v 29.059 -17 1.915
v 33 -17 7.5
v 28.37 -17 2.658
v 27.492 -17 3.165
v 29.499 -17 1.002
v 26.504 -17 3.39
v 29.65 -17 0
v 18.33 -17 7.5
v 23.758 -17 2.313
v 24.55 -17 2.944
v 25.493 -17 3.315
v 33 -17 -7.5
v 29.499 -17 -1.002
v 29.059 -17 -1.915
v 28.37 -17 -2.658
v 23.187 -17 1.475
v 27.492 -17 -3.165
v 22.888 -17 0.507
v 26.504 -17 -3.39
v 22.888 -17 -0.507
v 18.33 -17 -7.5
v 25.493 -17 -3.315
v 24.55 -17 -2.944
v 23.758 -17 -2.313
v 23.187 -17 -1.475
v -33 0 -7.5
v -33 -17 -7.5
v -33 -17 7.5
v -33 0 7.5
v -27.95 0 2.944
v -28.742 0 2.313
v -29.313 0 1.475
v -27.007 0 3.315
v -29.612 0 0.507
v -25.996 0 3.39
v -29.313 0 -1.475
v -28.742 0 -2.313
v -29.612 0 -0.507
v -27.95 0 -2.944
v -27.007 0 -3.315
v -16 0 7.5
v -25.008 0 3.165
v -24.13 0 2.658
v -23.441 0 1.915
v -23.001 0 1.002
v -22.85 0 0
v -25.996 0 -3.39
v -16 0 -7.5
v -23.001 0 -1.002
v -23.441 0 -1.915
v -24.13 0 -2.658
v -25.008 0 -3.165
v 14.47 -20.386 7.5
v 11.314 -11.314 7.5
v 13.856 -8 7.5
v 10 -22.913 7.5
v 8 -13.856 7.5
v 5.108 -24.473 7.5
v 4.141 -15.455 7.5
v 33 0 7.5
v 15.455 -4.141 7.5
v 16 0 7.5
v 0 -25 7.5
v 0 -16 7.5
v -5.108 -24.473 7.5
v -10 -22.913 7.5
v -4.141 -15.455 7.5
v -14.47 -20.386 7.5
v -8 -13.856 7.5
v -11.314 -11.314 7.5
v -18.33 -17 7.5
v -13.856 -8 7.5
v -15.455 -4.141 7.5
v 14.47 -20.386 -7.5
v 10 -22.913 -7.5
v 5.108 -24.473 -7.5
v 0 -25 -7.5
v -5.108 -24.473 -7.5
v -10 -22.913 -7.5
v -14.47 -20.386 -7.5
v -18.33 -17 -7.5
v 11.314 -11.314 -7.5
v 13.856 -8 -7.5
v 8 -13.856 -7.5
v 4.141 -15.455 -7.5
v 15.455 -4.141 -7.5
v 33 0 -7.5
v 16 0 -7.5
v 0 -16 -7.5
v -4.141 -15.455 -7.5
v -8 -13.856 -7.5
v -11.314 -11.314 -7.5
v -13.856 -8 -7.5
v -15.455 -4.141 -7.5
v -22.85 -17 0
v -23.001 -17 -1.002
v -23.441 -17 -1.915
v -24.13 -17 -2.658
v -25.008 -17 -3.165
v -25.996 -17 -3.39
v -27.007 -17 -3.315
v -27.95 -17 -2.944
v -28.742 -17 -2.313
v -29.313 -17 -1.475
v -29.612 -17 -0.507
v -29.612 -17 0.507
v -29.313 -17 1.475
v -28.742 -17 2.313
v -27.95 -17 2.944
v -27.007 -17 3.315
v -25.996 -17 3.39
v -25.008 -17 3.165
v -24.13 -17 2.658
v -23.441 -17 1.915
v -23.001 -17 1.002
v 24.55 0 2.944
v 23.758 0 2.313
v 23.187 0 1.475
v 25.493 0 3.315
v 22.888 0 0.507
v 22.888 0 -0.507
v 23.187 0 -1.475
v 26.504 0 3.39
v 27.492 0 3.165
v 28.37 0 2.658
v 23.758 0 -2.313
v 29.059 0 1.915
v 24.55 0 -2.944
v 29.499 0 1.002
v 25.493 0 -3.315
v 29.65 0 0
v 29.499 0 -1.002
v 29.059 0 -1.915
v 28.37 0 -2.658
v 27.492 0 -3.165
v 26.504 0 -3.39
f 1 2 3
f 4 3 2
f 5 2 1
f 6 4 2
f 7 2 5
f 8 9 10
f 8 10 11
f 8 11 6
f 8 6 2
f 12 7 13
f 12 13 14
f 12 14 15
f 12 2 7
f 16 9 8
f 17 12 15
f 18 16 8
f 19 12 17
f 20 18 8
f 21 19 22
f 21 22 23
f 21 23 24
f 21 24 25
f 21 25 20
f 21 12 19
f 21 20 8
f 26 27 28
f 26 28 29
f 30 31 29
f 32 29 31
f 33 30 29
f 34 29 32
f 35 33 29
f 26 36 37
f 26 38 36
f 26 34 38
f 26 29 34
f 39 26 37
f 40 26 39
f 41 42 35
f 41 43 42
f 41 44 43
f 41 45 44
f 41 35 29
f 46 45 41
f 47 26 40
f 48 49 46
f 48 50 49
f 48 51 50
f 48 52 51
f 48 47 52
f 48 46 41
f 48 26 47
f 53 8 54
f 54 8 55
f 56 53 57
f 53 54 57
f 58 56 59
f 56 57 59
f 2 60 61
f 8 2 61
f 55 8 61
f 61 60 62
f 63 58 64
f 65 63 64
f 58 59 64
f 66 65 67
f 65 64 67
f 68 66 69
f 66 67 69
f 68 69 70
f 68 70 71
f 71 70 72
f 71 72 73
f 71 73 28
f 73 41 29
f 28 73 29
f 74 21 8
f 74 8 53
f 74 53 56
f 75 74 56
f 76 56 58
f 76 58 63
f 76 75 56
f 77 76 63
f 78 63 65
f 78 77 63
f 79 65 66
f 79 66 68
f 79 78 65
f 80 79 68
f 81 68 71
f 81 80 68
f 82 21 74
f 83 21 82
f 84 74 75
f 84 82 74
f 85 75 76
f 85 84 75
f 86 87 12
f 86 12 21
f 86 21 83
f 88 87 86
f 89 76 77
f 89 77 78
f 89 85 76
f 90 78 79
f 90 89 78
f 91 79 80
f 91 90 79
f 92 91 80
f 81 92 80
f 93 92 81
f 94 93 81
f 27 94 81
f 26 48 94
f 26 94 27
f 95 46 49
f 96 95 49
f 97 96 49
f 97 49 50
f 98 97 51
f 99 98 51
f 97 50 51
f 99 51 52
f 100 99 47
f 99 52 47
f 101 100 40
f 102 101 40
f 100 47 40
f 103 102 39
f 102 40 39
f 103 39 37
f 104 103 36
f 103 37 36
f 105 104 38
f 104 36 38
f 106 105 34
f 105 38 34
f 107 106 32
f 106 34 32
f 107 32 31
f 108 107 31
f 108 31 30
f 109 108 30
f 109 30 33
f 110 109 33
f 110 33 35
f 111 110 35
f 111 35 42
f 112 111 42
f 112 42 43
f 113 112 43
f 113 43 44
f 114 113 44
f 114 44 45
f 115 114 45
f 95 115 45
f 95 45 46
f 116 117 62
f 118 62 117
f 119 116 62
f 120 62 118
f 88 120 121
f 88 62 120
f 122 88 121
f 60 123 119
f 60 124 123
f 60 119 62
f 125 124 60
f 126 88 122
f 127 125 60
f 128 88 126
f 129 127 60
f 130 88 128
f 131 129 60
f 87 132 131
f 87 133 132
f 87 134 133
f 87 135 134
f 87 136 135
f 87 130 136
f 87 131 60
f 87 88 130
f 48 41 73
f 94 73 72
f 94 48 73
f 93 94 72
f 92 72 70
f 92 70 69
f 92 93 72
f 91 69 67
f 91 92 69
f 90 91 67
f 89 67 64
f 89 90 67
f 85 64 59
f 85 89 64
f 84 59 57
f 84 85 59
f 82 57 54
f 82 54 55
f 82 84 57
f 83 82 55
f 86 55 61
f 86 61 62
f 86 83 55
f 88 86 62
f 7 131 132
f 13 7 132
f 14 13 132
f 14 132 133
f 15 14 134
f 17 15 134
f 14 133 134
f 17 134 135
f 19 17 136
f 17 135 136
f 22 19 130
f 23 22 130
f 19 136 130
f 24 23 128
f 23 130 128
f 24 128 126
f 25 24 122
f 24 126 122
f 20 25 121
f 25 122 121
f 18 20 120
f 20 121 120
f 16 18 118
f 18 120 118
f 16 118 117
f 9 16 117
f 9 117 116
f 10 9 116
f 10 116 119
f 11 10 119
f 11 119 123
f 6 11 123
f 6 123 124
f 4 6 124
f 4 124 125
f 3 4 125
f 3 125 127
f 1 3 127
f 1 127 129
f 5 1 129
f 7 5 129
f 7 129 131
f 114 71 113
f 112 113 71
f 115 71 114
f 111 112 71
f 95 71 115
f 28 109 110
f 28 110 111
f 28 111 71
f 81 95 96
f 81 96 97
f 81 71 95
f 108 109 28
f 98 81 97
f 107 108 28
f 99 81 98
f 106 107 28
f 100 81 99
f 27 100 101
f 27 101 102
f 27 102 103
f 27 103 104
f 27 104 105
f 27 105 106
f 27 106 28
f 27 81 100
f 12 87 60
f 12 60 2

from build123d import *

# Parameters (mm, degrees)
BOSS_EXTRUDE1_DEPTH      = 7.5
BOSS_EXTRUDE1_DEPTH_BACK = 7.5
TAP_DRILL_FOR_M8_TAP1_D  = 6.8


with BuildPart() as part:
    # Sketch1 → Boss-Extrude1 (new, two sides: drawn at the far end of the back side and taken through both)
    with BuildSketch(Plane.XY.offset(-BOSS_EXTRUDE1_DEPTH_BACK)):
        with BuildLine():
            Line((-33, 0), (-16, 0))
            ThreePointArc((-16, 0), (0, -16), (16, 0))
            Line((16, 0), (33, 0))
            Line((33, 0), (33, -17))
            Line((33, -17), (18.33030278, -17))
            ThreePointArc((18.33030278, -17), (0, -25), (-18.33030278, -17))
            Line((-18.33030278, -17), (-33, -17))
            Line((-33, -17), (-33, 0))
        make_face()
    extrude(amount=BOSS_EXTRUDE1_DEPTH + BOSS_EXTRUDE1_DEPTH_BACK)

    # Tap Drill for M8 Tap1 (through all)
    with Locations(Plane(origin=(0, -17, 0), x_dir=(-1, 0, 0), z_dir=(0, -1, 0))):
        with Locations((26.25, 0), (-26.25, 0)):
            Hole(TAP_DRILL_FOR_M8_TAP1_D / 2)


solid = part.part
